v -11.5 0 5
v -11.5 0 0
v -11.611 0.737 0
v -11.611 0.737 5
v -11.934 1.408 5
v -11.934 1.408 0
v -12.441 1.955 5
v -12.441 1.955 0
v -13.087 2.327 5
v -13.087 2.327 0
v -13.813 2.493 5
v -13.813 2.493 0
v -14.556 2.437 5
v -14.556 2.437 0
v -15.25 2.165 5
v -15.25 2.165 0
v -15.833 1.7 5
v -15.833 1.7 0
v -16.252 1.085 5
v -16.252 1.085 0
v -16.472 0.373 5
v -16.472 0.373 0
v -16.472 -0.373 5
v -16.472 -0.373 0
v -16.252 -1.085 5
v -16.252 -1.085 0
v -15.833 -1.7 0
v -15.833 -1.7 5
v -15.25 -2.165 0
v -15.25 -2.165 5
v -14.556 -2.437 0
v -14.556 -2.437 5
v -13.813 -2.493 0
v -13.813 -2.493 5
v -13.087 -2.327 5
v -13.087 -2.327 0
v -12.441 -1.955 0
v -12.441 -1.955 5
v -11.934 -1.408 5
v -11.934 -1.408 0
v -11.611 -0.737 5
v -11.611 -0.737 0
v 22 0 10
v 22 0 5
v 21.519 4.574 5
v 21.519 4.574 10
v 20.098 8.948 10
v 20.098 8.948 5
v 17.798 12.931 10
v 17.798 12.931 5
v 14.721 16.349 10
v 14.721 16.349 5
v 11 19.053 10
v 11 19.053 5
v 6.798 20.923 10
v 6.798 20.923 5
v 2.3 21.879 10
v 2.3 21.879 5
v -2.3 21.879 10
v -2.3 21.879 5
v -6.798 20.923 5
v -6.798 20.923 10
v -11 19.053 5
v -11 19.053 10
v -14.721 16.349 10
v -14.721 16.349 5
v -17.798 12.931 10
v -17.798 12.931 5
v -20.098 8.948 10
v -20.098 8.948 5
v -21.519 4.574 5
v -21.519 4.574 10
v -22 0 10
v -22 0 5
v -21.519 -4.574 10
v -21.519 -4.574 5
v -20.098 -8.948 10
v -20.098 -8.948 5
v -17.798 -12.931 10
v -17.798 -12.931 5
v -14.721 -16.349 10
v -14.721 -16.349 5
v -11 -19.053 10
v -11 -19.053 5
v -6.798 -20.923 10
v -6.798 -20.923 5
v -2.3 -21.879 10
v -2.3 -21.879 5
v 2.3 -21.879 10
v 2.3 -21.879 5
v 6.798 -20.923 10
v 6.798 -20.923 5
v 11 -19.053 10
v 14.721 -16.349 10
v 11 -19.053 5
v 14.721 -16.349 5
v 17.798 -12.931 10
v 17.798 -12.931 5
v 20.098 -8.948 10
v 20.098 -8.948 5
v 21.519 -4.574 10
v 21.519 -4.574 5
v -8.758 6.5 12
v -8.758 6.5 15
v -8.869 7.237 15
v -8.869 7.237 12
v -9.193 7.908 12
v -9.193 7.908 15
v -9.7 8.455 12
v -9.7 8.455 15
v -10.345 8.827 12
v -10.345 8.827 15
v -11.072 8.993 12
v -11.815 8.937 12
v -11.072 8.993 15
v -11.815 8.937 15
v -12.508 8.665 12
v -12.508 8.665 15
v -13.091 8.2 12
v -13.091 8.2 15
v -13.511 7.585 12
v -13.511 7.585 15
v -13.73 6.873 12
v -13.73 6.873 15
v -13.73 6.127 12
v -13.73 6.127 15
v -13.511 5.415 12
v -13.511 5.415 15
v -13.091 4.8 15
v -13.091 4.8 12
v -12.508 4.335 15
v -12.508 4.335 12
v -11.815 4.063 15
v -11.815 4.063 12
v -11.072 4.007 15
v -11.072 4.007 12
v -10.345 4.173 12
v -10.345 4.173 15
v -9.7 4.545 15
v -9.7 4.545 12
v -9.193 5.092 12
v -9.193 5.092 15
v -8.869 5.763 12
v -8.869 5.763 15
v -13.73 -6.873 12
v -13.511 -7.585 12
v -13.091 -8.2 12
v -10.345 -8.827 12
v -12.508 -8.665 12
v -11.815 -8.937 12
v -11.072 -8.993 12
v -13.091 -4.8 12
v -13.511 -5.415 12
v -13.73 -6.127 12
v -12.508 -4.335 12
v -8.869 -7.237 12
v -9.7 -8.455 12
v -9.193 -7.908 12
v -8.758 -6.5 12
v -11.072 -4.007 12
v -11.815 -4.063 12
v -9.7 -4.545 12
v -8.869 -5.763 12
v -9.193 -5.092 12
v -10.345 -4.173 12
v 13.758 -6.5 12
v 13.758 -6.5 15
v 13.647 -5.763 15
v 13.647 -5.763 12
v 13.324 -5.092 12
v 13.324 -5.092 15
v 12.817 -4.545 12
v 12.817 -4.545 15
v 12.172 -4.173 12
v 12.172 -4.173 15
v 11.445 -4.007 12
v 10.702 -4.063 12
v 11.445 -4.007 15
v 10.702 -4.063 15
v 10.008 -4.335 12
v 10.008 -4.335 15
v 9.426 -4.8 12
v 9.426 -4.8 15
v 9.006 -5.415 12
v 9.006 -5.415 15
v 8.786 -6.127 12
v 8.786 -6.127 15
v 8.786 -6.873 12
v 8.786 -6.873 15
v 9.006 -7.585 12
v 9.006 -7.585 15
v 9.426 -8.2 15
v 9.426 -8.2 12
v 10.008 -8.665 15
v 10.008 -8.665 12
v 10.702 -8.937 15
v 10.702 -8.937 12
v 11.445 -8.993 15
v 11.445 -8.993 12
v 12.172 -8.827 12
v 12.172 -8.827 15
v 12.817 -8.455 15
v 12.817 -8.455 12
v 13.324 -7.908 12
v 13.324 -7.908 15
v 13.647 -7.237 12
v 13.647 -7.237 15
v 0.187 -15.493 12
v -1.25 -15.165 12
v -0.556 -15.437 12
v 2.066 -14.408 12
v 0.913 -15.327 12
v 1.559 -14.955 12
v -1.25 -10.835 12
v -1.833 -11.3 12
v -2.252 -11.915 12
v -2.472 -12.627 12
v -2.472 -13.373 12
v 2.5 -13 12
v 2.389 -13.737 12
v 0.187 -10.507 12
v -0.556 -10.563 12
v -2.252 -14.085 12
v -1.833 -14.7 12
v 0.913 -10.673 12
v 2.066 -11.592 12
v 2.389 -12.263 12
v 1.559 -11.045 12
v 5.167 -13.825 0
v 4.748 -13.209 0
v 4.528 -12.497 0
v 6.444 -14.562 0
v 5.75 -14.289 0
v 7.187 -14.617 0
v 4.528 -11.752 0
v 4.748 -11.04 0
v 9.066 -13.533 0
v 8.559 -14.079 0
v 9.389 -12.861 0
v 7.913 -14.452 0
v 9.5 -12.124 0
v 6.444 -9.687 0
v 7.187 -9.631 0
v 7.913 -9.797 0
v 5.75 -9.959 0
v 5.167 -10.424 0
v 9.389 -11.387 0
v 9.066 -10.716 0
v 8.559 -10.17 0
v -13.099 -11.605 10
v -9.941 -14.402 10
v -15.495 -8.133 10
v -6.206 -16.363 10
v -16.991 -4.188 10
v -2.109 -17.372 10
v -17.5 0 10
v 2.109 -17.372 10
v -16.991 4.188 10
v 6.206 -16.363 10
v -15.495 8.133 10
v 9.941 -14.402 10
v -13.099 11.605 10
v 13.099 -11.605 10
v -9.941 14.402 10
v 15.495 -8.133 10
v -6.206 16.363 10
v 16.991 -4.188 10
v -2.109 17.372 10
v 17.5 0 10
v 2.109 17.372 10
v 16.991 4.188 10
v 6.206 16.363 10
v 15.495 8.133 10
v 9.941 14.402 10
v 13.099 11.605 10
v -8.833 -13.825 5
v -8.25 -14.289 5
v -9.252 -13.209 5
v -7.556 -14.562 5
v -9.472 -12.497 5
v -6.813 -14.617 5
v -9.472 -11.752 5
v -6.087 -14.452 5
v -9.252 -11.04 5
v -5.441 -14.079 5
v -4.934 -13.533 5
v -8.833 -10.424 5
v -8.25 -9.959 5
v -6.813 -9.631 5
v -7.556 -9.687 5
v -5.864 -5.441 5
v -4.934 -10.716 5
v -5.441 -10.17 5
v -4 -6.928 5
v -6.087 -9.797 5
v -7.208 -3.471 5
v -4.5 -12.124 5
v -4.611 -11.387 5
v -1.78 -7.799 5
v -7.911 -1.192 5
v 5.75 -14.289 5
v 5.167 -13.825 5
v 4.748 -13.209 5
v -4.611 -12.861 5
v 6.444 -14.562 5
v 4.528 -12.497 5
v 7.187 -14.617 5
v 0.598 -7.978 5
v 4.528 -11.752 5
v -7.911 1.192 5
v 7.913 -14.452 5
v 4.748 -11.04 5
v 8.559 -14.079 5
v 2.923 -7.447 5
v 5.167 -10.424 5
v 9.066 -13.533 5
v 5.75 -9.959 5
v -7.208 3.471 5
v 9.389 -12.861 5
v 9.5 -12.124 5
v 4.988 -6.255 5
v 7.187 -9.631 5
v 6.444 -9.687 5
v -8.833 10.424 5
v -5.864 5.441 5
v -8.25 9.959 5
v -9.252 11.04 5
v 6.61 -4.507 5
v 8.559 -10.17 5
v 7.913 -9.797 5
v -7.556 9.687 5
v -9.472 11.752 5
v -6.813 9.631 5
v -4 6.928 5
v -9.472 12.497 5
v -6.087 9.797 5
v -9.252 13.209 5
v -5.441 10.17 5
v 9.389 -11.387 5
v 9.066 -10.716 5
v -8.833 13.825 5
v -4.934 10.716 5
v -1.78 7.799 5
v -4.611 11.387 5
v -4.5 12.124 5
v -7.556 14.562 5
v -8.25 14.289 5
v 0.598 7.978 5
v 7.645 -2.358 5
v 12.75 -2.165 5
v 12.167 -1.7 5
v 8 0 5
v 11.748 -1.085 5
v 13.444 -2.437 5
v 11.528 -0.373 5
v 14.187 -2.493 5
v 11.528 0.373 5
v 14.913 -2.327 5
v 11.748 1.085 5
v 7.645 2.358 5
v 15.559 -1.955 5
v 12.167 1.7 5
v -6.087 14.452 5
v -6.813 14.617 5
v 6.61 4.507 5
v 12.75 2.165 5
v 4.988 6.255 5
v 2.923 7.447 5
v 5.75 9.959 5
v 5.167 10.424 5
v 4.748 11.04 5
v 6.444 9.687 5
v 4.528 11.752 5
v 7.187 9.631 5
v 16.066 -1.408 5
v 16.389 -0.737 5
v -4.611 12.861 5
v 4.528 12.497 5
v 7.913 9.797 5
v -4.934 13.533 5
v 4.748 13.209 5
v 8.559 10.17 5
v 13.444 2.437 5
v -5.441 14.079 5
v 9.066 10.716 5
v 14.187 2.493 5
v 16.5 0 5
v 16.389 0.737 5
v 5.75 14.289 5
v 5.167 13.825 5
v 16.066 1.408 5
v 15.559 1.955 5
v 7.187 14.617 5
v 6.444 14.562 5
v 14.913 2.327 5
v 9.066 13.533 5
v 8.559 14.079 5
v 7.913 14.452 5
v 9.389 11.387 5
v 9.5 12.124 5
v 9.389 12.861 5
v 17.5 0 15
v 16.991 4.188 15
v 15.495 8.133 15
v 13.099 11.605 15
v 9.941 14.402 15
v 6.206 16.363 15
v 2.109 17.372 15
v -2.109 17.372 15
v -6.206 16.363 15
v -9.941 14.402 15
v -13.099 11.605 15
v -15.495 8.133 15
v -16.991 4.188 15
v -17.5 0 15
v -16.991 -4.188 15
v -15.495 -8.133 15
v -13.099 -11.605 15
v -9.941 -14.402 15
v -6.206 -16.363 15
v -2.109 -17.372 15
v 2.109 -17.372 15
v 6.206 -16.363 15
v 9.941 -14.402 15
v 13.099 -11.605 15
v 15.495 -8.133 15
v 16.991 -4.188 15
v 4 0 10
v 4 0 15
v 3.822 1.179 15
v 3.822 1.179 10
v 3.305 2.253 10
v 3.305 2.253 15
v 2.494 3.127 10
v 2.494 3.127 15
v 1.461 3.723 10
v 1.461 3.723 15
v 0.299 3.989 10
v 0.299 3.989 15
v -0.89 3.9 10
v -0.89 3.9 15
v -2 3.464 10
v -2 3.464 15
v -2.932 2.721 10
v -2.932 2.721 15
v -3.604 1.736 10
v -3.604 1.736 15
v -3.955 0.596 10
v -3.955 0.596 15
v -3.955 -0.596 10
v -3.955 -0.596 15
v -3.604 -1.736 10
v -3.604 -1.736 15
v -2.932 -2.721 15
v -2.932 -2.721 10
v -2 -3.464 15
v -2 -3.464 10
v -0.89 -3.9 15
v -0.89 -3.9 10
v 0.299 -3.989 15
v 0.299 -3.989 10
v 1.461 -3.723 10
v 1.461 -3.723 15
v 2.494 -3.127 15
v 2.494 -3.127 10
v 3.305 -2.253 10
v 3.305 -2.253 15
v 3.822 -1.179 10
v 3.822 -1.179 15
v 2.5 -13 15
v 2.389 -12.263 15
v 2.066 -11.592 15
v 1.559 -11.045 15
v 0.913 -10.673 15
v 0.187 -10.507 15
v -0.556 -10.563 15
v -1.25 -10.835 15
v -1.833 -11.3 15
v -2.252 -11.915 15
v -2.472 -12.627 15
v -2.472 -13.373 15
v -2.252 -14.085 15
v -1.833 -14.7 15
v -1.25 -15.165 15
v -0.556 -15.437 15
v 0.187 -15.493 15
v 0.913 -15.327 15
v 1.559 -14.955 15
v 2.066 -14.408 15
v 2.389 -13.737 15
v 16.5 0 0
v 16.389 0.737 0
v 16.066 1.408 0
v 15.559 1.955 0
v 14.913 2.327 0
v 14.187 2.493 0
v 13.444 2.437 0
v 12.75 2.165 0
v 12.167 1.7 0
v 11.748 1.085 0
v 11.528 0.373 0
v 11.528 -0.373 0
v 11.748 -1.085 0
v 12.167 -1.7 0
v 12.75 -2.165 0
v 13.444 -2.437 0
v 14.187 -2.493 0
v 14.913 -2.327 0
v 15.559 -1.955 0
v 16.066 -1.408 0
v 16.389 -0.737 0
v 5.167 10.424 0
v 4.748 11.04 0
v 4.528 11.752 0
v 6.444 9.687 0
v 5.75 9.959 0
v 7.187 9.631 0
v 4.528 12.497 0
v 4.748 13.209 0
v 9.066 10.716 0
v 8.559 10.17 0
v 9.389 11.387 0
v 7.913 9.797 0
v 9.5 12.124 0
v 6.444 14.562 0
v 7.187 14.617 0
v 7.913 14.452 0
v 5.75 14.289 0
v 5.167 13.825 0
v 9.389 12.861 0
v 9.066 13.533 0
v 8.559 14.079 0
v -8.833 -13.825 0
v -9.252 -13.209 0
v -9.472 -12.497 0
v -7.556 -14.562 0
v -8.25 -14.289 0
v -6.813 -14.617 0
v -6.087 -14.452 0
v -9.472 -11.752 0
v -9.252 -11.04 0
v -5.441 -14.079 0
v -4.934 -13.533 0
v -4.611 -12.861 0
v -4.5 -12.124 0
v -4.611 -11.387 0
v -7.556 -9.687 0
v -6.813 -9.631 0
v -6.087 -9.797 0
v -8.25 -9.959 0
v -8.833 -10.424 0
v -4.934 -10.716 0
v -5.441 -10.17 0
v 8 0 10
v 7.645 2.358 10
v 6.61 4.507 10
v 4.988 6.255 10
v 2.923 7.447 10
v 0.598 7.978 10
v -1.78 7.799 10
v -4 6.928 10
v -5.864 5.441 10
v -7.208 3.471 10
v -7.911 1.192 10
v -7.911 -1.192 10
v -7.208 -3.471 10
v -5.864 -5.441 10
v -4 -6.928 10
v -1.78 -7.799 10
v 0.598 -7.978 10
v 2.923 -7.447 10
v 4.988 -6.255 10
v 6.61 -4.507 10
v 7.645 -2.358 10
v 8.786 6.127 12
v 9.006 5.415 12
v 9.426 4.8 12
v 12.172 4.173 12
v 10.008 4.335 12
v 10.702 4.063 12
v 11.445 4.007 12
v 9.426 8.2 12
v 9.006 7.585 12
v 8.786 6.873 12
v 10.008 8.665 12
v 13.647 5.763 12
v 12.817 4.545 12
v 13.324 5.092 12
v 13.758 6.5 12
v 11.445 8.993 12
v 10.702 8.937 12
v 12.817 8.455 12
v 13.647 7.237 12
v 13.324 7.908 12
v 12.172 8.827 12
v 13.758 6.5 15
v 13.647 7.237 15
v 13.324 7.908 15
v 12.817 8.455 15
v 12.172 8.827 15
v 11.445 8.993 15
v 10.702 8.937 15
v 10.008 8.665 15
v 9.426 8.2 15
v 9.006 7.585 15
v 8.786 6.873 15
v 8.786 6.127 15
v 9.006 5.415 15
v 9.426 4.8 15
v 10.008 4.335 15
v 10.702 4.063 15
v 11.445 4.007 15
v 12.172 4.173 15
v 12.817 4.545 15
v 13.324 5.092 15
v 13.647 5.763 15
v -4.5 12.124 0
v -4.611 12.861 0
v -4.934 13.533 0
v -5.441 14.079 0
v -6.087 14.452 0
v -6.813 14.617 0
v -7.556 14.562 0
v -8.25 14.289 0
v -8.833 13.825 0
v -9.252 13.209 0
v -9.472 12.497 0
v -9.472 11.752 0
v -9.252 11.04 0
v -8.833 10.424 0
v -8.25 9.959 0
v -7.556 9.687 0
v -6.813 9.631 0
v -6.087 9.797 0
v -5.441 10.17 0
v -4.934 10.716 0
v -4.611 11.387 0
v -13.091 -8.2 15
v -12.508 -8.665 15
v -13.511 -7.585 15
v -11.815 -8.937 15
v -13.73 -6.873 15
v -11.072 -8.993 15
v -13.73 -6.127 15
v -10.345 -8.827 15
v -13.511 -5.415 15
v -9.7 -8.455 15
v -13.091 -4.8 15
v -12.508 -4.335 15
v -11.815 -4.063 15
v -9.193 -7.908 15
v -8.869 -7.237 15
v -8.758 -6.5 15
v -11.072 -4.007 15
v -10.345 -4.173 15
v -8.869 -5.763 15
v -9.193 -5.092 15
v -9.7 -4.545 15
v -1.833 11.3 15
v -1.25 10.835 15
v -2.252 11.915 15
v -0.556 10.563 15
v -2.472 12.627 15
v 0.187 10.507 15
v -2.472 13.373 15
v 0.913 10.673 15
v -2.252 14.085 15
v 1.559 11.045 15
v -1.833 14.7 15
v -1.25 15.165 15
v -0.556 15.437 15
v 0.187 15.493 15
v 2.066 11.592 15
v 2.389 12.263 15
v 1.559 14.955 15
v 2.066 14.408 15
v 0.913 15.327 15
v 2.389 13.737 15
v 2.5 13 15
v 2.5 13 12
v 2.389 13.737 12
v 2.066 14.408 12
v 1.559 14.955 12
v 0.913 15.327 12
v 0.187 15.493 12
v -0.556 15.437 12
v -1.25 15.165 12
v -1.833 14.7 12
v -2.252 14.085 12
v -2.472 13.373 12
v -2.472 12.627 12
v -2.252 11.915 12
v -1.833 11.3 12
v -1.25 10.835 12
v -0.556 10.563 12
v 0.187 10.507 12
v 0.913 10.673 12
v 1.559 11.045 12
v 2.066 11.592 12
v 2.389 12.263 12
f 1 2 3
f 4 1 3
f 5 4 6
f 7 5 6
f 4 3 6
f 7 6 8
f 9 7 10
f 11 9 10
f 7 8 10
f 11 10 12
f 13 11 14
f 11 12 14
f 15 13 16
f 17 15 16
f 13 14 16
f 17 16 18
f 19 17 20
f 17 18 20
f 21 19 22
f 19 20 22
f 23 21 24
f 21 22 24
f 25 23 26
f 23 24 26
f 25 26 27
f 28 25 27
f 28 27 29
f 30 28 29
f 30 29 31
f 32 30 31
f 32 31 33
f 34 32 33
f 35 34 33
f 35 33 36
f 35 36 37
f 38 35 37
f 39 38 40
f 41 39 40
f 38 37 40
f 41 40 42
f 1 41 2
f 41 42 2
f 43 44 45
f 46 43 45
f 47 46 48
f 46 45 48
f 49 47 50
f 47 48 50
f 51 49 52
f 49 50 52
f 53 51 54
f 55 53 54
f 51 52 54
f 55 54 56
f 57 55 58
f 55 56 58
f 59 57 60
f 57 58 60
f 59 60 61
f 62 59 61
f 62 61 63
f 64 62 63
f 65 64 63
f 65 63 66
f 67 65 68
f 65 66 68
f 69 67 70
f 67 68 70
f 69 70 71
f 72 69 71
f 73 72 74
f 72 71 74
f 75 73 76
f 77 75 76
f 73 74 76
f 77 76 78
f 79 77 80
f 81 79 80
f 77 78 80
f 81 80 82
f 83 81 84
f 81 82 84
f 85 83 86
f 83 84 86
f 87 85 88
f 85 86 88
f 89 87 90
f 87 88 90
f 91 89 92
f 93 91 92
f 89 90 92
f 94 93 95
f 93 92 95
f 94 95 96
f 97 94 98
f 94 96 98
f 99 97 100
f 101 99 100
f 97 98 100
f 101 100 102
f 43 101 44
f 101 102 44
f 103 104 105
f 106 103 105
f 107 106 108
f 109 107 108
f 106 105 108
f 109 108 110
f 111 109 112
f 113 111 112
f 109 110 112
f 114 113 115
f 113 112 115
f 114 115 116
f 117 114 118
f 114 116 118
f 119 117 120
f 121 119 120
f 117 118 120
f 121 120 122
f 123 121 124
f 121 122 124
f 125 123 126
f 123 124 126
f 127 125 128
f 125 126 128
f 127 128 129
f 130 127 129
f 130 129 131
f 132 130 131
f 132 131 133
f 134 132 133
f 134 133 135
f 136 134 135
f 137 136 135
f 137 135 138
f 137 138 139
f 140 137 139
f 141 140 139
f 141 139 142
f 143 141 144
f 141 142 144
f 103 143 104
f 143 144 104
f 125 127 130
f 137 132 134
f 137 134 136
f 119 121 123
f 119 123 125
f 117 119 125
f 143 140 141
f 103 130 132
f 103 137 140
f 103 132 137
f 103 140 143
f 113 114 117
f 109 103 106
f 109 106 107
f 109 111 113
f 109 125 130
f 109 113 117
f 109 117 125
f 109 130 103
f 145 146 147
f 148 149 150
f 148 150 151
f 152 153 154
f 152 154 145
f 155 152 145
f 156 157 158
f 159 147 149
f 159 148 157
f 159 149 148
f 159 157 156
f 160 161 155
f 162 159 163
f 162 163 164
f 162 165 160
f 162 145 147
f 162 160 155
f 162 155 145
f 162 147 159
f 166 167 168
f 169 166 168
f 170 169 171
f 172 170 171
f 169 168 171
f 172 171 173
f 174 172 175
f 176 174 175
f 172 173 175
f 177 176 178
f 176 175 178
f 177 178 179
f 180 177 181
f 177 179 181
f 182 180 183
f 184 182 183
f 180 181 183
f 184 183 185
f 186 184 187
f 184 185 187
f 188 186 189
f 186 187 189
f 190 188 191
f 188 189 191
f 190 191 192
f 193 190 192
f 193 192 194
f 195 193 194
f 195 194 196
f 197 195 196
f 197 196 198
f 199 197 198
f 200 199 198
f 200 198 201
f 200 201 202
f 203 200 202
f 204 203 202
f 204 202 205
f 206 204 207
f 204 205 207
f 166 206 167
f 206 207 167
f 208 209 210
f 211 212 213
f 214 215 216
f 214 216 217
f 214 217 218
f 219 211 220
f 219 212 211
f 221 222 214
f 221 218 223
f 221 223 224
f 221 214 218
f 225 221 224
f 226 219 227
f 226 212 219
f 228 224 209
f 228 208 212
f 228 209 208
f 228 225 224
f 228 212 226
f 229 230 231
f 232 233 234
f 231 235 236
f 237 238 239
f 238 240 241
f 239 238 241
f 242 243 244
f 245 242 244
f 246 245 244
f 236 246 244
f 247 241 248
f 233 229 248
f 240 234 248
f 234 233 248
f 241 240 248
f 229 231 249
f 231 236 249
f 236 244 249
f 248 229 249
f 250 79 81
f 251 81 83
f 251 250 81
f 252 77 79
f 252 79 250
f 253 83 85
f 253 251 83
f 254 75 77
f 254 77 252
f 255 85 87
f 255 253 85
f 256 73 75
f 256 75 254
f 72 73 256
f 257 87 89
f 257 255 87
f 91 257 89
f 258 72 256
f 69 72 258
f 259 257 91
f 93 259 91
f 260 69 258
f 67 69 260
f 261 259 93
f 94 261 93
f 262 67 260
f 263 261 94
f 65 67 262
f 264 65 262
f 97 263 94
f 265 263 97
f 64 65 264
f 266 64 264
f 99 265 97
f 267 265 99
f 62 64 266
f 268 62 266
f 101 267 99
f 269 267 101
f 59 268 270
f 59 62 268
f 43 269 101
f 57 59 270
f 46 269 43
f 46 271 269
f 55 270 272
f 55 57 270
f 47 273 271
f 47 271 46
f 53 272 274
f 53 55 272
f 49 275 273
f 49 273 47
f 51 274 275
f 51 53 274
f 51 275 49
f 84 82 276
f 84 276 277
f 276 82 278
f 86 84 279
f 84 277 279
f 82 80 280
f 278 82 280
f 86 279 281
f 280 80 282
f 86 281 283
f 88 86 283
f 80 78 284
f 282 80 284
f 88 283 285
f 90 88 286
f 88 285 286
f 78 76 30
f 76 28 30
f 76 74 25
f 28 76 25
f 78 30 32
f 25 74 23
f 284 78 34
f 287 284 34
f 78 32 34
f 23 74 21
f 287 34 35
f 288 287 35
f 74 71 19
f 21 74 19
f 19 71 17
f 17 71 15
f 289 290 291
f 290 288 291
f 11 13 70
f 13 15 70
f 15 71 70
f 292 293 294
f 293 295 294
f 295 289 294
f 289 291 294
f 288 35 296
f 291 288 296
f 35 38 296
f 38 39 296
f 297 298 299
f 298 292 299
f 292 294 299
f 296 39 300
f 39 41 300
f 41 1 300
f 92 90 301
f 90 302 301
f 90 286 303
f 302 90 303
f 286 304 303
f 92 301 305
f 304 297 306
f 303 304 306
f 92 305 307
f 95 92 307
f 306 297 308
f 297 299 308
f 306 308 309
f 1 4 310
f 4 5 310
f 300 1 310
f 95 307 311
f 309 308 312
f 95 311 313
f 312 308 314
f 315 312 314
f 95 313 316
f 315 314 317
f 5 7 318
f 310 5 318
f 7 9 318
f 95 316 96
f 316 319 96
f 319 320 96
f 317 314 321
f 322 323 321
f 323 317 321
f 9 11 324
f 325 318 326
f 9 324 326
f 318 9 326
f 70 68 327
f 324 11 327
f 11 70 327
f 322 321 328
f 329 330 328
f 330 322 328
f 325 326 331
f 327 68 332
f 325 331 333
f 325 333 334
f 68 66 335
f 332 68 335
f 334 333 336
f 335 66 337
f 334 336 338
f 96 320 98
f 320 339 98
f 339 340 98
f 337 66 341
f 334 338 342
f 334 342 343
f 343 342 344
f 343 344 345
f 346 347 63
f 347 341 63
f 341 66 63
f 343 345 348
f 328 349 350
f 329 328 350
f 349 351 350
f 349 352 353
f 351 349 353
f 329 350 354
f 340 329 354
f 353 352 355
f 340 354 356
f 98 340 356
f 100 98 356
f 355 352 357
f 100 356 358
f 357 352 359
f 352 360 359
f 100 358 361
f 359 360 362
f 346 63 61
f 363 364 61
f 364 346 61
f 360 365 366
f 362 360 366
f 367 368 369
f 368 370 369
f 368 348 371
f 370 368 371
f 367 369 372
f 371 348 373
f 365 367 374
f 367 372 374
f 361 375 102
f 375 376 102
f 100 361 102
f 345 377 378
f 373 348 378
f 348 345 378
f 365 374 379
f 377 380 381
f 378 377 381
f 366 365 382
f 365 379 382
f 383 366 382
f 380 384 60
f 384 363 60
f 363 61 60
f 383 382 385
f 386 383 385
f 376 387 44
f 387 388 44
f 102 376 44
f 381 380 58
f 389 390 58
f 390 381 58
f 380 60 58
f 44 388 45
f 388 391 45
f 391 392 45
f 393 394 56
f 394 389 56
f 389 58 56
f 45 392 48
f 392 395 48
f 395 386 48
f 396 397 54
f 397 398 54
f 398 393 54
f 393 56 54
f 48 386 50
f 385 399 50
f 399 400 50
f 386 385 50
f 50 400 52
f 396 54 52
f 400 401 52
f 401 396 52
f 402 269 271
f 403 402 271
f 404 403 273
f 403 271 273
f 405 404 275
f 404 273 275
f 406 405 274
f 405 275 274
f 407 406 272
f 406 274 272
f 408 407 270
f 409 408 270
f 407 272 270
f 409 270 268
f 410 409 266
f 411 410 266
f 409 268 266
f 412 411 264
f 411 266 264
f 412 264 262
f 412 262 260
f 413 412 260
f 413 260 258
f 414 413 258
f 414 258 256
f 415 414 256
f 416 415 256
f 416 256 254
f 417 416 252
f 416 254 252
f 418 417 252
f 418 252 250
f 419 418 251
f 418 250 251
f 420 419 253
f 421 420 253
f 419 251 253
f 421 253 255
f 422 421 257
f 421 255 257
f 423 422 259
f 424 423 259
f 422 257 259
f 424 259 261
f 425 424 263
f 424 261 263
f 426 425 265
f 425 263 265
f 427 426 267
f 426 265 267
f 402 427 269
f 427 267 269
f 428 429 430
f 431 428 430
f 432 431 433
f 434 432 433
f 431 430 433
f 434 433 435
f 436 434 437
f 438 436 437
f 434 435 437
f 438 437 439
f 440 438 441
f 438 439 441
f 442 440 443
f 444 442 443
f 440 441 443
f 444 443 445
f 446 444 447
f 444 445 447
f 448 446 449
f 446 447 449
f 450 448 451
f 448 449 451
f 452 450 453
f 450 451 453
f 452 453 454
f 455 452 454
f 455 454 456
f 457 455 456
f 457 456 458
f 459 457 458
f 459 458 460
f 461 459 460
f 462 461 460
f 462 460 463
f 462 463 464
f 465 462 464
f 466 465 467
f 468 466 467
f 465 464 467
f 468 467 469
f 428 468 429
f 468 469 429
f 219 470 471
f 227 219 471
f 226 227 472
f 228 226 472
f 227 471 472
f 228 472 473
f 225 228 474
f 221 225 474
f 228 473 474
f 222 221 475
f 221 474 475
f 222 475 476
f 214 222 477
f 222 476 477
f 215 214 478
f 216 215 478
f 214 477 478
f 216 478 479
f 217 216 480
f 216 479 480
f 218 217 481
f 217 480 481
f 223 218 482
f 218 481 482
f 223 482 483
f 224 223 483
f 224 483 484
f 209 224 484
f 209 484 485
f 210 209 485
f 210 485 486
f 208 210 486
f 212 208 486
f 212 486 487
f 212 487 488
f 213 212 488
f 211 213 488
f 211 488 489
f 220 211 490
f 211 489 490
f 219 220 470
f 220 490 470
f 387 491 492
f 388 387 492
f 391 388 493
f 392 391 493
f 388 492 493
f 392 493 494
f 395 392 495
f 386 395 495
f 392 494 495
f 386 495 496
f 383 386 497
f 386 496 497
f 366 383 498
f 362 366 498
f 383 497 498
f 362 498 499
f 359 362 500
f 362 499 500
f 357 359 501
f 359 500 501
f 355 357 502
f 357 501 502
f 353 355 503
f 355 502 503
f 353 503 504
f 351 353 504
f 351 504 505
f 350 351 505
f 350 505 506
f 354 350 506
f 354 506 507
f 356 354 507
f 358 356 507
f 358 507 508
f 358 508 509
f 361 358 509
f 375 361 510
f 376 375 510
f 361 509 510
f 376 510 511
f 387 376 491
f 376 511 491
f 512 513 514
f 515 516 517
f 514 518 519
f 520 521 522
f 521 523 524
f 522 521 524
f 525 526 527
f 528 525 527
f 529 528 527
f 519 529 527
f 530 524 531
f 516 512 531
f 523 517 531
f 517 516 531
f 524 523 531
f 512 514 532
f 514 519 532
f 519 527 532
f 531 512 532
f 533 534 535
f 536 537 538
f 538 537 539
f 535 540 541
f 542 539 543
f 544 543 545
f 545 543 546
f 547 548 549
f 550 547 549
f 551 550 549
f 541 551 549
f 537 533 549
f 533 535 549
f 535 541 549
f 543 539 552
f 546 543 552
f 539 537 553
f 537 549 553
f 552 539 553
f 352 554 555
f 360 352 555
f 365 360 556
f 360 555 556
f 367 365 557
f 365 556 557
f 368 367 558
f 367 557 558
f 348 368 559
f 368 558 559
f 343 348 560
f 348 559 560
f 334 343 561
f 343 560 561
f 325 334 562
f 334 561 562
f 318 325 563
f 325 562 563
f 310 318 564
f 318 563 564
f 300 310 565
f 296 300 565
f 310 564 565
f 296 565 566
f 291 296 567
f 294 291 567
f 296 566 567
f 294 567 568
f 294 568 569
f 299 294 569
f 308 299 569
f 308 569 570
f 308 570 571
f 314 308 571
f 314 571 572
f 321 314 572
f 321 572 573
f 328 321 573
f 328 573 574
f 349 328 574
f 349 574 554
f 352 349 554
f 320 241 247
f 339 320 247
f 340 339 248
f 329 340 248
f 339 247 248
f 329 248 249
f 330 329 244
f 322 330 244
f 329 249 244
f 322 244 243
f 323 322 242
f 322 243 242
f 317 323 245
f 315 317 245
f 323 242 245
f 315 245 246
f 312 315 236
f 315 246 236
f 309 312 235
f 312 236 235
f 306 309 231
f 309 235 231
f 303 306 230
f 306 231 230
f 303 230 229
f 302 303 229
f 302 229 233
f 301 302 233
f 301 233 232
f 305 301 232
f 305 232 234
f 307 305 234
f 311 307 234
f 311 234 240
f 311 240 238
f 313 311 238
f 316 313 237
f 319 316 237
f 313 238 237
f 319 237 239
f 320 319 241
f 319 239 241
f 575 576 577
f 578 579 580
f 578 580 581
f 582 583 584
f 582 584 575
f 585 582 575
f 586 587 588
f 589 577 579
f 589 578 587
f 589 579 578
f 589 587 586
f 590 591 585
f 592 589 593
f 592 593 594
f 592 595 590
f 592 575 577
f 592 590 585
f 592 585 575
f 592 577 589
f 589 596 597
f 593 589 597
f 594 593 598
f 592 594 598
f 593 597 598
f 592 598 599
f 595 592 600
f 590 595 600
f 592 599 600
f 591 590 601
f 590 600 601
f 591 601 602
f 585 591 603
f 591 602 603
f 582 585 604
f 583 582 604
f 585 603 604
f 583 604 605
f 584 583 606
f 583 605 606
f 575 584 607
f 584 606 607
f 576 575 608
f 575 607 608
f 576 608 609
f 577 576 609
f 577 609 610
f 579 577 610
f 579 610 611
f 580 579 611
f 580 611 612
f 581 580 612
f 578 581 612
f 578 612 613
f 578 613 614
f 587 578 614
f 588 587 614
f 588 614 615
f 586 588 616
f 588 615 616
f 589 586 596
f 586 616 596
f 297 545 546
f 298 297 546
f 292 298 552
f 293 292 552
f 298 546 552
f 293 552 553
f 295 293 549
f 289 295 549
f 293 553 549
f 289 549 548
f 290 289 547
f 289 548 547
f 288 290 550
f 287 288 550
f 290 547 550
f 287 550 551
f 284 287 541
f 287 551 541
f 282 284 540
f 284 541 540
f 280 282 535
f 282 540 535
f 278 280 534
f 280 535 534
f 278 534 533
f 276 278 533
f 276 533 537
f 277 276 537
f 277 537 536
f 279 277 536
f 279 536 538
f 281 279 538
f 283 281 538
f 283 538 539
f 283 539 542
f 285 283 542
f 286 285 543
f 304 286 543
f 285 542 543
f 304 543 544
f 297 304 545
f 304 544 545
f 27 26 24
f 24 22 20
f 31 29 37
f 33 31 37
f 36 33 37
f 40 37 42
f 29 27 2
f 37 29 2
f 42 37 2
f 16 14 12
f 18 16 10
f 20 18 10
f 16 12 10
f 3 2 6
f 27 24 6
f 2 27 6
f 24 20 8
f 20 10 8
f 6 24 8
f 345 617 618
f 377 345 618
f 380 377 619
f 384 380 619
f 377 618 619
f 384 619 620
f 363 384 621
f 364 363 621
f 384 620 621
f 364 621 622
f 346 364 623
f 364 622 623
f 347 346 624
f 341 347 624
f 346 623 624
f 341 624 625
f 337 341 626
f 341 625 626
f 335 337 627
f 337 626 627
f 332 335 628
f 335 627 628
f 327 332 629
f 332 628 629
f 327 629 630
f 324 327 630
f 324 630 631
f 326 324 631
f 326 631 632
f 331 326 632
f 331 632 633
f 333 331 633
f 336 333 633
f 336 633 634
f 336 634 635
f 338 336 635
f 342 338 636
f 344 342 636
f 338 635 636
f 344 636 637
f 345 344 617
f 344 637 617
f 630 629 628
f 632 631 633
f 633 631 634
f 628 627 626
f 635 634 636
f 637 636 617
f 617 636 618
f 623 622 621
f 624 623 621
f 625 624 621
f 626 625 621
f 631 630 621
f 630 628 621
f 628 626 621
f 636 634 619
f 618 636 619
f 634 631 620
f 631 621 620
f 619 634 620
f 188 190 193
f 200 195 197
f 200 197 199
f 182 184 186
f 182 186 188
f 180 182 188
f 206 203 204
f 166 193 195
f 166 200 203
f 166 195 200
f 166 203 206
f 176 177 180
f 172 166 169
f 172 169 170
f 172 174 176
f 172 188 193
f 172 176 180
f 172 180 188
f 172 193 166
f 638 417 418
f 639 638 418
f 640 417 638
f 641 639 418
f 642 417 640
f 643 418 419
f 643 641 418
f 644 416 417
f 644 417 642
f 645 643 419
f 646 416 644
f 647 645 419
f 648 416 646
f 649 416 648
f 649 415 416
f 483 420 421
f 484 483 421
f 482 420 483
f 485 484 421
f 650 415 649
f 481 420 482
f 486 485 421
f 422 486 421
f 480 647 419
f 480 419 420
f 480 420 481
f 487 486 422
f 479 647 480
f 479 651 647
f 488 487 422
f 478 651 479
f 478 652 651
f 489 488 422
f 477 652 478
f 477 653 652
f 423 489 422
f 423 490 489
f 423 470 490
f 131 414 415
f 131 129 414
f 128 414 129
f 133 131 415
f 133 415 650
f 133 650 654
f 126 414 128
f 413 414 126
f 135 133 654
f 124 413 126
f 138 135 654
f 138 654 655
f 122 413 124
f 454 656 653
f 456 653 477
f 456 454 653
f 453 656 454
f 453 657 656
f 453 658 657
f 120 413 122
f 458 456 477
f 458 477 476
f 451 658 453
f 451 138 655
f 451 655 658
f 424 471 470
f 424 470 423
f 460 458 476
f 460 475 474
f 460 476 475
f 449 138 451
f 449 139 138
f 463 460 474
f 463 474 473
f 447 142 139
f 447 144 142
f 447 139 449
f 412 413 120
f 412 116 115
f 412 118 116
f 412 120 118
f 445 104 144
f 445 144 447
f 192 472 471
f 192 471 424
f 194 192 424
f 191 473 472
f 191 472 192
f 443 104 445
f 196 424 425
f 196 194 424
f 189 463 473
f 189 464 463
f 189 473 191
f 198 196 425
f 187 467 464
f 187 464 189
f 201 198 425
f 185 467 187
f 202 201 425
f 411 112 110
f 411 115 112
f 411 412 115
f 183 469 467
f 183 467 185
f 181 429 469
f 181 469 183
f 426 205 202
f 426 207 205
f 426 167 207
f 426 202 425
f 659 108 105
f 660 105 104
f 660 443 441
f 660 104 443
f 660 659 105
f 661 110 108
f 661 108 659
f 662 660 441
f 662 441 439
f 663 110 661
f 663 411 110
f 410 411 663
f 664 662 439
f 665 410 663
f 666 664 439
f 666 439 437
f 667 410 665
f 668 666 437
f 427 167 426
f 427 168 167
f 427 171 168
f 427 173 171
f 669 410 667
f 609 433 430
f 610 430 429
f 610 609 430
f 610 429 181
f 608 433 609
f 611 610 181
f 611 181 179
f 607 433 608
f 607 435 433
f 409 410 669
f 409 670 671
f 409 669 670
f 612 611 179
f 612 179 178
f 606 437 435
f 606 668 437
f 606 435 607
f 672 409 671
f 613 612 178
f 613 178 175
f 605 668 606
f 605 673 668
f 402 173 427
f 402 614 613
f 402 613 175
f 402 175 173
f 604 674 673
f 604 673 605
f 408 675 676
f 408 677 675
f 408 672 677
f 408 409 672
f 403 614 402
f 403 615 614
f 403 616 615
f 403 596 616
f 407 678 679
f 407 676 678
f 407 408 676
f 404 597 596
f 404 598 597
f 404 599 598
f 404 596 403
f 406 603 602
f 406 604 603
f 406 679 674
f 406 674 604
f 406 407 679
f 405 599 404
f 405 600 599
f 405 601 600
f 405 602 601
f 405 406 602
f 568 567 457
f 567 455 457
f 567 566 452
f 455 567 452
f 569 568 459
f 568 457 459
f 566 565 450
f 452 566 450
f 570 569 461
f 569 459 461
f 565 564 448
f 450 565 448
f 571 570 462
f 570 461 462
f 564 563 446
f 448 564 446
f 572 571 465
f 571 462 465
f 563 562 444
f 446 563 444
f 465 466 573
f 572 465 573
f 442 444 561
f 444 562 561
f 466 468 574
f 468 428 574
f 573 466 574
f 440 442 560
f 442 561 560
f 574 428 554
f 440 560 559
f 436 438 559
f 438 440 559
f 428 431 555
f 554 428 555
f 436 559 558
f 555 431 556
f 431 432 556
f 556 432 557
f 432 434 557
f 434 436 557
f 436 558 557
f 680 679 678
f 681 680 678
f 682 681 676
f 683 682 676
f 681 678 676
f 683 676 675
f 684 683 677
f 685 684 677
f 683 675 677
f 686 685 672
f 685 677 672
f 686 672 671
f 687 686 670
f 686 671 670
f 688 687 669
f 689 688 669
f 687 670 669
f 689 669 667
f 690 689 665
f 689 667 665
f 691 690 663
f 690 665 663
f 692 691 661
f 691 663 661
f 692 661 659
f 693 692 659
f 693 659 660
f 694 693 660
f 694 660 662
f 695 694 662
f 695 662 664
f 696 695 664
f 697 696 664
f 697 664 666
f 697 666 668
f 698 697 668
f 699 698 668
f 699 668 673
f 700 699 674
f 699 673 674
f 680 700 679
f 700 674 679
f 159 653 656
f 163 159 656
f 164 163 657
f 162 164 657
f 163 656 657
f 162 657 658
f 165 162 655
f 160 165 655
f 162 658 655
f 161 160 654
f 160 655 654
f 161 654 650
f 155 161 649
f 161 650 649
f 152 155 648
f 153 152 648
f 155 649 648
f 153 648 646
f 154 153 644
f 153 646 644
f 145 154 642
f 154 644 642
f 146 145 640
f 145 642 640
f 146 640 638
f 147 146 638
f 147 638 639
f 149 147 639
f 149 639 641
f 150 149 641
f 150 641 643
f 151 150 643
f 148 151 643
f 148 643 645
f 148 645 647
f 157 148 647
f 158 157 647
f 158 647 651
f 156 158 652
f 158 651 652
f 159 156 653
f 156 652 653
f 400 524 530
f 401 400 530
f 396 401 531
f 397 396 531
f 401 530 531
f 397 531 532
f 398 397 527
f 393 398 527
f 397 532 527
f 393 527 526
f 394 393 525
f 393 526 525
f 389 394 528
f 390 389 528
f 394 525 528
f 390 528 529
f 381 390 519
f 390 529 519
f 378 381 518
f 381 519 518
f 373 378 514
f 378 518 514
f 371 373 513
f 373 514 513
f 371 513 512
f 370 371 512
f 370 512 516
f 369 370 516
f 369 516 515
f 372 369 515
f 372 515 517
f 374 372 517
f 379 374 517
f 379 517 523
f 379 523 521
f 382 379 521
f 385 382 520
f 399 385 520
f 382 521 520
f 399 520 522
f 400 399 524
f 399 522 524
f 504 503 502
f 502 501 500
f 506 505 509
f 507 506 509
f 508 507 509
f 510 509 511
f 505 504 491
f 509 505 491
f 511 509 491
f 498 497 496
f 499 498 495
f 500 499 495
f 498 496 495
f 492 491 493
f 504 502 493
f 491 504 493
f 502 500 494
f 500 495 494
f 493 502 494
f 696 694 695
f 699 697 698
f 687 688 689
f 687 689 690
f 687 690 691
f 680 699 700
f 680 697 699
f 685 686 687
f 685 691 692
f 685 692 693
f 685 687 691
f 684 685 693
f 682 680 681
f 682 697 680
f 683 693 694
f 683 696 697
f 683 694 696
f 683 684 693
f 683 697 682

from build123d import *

# Parameters (mm, degrees)
SKETCH2_R             = 2.5
BOSS_EXTRUDE1_DEPTH   = 5
BOSS_EXTRUDE1_2_DEPTH = 5
BOSS_EXTRUDE1_3_DEPTH = 5
BOSS_EXTRUDE1_4_DEPTH = 5
BOSS_EXTRUDE1_5_DEPTH = 5
BOSS_EXTRUDE1_6_DEPTH = 5
SKETCH3_R             = 22
BOSS_EXTRUDE2_DEPTH   = 5
SKETCH4_R             = 17.5
BOSS_EXTRUDE3_DEPTH   = 5
SKETCH5_R             = 8
CUT_EXTRUDE1_DEPTH    = 10
SKETCH11_R            = 2.5
CUT_EXTRUDE4_DEPTH    = 3
SKETCH13_R            = 8
SKETCH13_R_2          = 4
BOSS_EXTRUDE5_DEPTH   = 5


with BuildPart() as part:
    # Sketch2 → Boss-Extrude1 (new body)
    with BuildSketch(Plane.XY):
        with Locations((-7, 12.124355653)):
            Circle(SKETCH2_R)
    extrude(amount=BOSS_EXTRUDE1_DEPTH)



with BuildPart() as body_2:
    # Sketch2 → Boss-Extrude1 2 (new body)
    with BuildSketch(Plane.XY):
        with Locations((7, 12.124355653)):
            Circle(SKETCH2_R)
    extrude(amount=BOSS_EXTRUDE1_2_DEPTH)


with BuildPart() as body_3:
    # Sketch2 → Boss-Extrude1 3 (new body)
    with BuildSketch(Plane.XY):
        with Locations((14, 0)):
            Circle(SKETCH2_R)
    extrude(amount=BOSS_EXTRUDE1_3_DEPTH)


with BuildPart() as body_4:
    # Sketch2 → Boss-Extrude1 4 (new body)
    with BuildSketch(Plane.XY):
        with Locations((7, -12.124355653)):
            Circle(SKETCH2_R)
    extrude(amount=BOSS_EXTRUDE1_4_DEPTH)


with BuildPart() as body_5:
    # Sketch2 → Boss-Extrude1 5 (new body)
    with BuildSketch(Plane.XY):
        with Locations((-7, -12.124355653)):
            Circle(SKETCH2_R)
    extrude(amount=BOSS_EXTRUDE1_5_DEPTH)


with BuildPart() as body_6:
    # Sketch2 → Boss-Extrude1 6 (new body)
    with BuildSketch(Plane.XY):
        with Locations((-14, 0)):
            Circle(SKETCH2_R)
    extrude(amount=BOSS_EXTRUDE1_6_DEPTH)


with BuildPart() as part_1:
    add(part.part)

    add(body_2.part)  # Boss-Extrude2 merges body 2

    add(body_3.part)  # Boss-Extrude2 merges body 3

    add(body_4.part)  # Boss-Extrude2 merges body 4

    add(body_5.part)  # Boss-Extrude2 merges body 5

    add(body_6.part)  # Boss-Extrude2 merges body 6
    # Sketch3 → Boss-Extrude2 (add)
    with BuildSketch(Plane.XY.offset(5)):
        Circle(SKETCH3_R)
    extrude(amount=BOSS_EXTRUDE2_DEPTH)

    # Sketch4 → Boss-Extrude3 (add)
    with BuildSketch(Plane.XY.offset(10)):
        Circle(SKETCH4_R)
    extrude(amount=BOSS_EXTRUDE3_DEPTH)

    # Sketch5 → Cut-Extrude1 (cut)
    with BuildSketch(Plane.XY.offset(15)):
        Circle(SKETCH5_R)
    extrude(amount=-CUT_EXTRUDE1_DEPTH, mode=Mode.SUBTRACT)

    # Sketch11 → Cut-Extrude4 (cut)
    with BuildSketch(Plane.XY.offset(15)):
        with Locations((0, 13)):
            Circle(SKETCH11_R)
        with Locations((11.258330249, 6.5)):
            Circle(SKETCH11_R)
        with Locations((11.258330249, -6.5)):
            Circle(SKETCH11_R)
        with Locations((0, -13)):
            Circle(SKETCH11_R)
        with Locations((-11.258330249, -6.5)):
            Circle(SKETCH11_R)
        with Locations((-11.258330249, 6.5)):
            Circle(SKETCH11_R)
    extrude(amount=-CUT_EXTRUDE4_DEPTH, mode=Mode.SUBTRACT)

    # Sketch13 → Boss-Extrude5 (add)
    with BuildSketch(Plane.XY.offset(15)):
        Circle(SKETCH13_R)
        Circle(SKETCH13_R_2, mode=Mode.SUBTRACT)
    extrude(amount=-BOSS_EXTRUDE5_DEPTH)


solid = part_1.part
